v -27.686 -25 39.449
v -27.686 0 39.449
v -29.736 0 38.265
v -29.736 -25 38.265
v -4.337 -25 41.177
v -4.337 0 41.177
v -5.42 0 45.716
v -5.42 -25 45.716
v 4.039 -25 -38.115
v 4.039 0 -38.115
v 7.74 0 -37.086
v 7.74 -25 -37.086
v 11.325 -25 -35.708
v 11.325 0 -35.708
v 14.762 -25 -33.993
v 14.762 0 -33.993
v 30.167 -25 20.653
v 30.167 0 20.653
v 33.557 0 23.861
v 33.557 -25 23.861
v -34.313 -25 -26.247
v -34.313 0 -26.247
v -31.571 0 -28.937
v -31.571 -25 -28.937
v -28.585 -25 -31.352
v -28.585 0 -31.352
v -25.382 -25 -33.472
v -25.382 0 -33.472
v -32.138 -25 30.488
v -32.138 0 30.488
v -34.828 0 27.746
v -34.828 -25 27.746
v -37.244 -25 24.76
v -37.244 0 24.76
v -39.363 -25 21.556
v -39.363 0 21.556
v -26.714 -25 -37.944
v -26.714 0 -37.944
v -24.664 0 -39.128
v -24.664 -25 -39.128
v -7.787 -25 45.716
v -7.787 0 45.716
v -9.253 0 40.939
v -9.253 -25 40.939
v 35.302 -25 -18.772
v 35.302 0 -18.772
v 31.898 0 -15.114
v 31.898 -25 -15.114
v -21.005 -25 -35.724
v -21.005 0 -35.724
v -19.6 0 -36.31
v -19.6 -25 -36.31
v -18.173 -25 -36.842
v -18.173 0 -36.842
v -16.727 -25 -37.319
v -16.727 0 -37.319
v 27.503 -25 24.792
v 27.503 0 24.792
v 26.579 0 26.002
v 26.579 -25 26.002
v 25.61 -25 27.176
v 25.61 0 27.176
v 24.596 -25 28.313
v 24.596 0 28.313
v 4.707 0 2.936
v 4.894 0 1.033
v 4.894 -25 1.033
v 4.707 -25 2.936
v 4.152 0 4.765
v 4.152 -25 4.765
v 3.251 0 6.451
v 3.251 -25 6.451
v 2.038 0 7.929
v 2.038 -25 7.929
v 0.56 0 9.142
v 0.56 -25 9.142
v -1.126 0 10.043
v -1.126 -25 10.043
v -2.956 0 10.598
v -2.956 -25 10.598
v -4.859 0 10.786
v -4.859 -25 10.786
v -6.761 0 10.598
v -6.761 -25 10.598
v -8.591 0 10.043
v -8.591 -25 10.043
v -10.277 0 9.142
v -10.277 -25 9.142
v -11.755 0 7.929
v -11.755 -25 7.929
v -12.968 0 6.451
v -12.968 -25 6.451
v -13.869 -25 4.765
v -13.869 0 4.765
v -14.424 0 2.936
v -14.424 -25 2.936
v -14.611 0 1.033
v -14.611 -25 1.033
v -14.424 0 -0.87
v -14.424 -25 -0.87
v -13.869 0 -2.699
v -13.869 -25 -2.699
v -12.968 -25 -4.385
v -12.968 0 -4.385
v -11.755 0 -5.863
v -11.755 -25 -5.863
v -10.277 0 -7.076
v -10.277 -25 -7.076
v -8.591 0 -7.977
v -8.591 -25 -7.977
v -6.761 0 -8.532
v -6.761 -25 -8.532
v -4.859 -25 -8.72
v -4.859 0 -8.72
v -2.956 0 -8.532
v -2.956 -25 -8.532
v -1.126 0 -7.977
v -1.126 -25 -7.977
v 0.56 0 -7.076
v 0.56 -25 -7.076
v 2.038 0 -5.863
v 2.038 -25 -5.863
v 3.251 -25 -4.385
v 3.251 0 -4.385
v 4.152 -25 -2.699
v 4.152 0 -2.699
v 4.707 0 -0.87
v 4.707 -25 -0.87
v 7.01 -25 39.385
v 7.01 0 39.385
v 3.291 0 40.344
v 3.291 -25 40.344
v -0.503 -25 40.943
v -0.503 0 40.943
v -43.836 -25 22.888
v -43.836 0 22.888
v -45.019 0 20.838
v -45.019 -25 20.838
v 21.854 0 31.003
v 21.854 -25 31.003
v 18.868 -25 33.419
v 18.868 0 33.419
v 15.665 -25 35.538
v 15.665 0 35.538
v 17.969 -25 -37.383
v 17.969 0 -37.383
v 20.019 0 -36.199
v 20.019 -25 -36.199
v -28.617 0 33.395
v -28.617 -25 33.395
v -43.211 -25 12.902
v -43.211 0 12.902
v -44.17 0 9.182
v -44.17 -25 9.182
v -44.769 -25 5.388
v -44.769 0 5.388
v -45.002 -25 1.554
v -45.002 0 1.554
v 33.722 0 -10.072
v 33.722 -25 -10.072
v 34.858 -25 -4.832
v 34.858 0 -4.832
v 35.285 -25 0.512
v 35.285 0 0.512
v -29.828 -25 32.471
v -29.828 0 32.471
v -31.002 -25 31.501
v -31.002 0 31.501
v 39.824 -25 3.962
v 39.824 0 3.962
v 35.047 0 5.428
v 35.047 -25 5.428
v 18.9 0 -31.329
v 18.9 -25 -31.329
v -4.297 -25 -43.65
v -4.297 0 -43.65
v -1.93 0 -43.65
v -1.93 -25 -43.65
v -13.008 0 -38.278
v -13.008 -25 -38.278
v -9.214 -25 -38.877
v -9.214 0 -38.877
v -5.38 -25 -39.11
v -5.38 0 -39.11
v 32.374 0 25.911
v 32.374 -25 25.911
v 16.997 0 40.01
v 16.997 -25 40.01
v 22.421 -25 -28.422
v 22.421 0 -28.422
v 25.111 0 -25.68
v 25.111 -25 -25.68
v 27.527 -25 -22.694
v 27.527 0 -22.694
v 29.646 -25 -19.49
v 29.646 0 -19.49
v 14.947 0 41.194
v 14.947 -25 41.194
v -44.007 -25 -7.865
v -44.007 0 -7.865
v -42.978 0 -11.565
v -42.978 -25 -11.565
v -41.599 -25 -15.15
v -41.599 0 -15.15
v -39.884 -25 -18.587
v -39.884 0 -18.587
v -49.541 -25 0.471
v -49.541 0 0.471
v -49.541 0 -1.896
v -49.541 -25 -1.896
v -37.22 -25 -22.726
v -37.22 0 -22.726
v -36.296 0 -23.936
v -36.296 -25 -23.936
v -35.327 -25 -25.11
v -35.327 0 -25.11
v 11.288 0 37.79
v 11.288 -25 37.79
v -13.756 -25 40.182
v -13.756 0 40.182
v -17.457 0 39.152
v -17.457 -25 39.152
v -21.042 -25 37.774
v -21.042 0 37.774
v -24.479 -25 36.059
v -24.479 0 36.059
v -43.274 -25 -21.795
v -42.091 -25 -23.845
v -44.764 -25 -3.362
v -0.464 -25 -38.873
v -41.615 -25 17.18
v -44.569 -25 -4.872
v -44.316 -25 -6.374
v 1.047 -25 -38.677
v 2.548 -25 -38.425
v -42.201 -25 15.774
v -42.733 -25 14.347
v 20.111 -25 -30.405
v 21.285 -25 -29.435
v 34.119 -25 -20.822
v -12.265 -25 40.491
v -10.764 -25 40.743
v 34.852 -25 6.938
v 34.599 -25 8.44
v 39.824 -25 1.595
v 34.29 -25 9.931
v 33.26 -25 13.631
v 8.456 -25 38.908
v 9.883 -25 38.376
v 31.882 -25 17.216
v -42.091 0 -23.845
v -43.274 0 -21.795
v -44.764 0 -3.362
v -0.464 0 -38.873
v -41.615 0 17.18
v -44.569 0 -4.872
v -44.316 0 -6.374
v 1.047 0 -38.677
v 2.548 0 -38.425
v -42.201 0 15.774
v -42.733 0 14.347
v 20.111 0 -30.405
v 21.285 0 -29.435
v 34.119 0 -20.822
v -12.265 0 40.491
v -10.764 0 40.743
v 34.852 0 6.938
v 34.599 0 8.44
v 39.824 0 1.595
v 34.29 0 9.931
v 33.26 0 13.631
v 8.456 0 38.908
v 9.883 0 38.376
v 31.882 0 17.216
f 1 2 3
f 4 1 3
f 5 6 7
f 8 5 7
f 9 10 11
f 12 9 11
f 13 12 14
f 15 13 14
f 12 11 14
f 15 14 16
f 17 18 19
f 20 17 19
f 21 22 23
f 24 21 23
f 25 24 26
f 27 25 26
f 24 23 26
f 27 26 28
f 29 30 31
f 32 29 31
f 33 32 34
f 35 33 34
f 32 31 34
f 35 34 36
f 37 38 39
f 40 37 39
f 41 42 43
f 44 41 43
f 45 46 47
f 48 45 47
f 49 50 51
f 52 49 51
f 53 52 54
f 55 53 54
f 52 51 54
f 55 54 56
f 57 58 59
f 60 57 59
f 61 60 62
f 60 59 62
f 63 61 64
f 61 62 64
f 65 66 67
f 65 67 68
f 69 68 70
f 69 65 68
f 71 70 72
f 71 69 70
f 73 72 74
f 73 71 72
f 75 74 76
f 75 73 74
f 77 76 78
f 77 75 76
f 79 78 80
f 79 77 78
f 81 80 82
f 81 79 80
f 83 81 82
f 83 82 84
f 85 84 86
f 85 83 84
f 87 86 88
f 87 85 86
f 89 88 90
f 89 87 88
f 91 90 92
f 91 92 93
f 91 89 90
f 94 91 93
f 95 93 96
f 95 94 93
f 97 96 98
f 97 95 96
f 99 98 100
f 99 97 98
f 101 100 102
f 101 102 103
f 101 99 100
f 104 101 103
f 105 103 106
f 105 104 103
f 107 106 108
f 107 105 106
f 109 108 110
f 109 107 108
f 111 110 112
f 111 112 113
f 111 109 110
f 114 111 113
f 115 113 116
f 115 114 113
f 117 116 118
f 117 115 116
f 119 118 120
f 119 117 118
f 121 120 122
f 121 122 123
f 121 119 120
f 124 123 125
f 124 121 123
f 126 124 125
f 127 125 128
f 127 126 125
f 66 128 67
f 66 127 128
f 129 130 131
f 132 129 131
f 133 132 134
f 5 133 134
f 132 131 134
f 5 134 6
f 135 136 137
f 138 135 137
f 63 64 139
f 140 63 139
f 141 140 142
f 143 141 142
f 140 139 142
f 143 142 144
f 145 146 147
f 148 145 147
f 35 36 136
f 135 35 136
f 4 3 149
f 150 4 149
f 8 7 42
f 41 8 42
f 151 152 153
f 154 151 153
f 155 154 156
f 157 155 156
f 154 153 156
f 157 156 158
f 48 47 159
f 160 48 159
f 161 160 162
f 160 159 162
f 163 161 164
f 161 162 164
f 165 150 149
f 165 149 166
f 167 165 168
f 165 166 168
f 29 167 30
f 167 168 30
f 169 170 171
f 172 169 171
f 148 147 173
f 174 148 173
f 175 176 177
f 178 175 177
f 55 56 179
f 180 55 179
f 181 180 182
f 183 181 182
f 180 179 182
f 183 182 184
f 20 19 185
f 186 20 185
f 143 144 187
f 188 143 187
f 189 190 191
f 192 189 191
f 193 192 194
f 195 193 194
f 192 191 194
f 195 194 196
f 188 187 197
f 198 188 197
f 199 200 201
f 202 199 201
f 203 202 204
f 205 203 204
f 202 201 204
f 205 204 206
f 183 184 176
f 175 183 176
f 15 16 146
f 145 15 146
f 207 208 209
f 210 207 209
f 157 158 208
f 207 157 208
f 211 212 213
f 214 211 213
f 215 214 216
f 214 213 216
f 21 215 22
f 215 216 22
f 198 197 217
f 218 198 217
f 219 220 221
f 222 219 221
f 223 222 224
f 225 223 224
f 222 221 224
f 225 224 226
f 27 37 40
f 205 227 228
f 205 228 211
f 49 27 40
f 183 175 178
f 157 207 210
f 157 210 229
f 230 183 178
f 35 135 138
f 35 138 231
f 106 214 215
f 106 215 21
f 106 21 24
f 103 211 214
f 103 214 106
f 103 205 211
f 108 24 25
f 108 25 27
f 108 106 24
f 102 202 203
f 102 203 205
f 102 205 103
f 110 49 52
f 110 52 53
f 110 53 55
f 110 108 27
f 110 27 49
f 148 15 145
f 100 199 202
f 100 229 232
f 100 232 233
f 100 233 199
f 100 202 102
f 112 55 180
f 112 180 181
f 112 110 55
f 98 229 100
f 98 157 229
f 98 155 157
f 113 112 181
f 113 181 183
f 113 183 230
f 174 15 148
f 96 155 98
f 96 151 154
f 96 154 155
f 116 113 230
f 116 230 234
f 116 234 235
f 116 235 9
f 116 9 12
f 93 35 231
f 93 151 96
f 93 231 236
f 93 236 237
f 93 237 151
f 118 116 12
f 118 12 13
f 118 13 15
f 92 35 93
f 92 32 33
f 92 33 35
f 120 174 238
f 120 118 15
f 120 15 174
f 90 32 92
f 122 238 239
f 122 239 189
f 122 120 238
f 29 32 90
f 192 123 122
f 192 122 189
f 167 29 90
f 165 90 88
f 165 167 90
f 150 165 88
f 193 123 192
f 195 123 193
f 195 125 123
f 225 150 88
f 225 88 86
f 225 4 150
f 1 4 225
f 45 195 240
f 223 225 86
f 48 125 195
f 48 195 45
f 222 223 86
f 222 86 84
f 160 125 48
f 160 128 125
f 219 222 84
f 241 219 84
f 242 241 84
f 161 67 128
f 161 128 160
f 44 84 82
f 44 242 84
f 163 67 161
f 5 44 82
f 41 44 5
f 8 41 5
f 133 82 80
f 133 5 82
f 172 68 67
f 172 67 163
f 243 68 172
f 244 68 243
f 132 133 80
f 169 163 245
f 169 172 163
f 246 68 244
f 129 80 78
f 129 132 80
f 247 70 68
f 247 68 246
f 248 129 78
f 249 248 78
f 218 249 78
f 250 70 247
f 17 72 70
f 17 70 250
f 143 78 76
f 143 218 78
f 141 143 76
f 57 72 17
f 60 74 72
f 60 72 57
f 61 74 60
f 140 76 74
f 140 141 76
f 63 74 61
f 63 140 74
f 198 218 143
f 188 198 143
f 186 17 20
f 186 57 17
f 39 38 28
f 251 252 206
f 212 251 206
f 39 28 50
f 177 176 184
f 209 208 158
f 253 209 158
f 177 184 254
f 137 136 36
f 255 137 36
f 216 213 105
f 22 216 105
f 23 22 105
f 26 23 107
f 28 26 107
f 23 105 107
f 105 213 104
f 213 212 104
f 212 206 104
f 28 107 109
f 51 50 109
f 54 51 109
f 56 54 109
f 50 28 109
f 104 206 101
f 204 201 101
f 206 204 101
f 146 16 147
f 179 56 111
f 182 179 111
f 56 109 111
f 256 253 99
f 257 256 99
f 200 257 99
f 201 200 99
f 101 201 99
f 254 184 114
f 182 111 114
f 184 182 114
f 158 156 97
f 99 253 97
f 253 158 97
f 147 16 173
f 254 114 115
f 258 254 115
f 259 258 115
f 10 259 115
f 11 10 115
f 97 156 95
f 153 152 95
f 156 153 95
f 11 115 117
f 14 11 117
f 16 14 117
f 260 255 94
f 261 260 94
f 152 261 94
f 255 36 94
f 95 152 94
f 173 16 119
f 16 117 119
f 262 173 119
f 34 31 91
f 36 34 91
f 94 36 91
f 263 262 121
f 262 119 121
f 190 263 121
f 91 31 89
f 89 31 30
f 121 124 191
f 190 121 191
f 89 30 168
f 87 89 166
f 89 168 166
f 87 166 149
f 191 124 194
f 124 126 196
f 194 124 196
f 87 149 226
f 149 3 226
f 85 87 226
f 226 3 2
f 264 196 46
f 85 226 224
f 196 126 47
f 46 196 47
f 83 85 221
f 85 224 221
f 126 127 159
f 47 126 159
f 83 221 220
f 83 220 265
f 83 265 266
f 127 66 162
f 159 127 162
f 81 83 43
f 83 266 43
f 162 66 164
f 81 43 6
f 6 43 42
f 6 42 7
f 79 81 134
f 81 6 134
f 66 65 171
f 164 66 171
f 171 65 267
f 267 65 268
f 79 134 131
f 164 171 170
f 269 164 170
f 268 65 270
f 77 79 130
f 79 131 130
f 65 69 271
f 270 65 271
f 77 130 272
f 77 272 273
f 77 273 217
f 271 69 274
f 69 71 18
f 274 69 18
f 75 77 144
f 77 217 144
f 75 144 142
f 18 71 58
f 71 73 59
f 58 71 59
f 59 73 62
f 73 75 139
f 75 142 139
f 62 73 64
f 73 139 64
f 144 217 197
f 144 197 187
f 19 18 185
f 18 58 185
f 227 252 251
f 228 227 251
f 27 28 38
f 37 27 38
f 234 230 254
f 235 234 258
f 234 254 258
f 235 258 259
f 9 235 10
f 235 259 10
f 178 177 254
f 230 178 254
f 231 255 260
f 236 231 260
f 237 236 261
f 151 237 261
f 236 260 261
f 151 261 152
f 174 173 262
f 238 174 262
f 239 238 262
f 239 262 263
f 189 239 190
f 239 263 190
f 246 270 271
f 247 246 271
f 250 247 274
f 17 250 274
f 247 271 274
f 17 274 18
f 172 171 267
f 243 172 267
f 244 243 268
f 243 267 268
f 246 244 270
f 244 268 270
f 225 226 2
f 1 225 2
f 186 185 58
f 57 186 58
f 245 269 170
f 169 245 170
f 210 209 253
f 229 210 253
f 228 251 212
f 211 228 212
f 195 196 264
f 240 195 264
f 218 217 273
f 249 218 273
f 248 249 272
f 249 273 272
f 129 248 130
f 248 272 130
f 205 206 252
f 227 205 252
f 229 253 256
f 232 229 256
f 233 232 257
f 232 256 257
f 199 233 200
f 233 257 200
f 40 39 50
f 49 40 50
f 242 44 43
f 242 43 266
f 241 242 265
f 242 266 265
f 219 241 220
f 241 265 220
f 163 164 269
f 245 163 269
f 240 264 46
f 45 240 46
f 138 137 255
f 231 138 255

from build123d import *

# Parameters (mm, degrees)
F1_DEPTH = 25
F0_R     = 9.7528106777
F2_DEPTH = 25
F3_COUNT = 12


with BuildPart() as f1:
    # F0 (on Front) → F1 (new body)
    with BuildSketch(Plane.XZ):
        with BuildLine():
            ThreePointArc((35.2883561629, 1.0330273155), (27.4544642418, 24.8582881027), (7.0100539825, 39.385469638))
            ThreePointArc((7.0100539825, 39.385469638), (1.4007375004, 40.6889829464), (-4.3373688538, 41.1765419779))
            ThreePointArc((-4.3373688538, 41.1765419779), (-6.7990788962, 41.1329986982), (-9.2534905381, 40.9386386143))
            ThreePointArc((-9.2534905381, 40.9386386143), (-31.6478100439, -28.8686194646), (35.2883561629, 1.0330273155))
        make_face()
        with BuildLine():
            ThreePointArc((-4.85854148, 30.3700273155), (14.134700216, 22.5027690116), (22.00195852, 3.5095273155))
            ThreePointArc((22.00195852, 3.5095273155), (-22.4423355568, -16.7955618523), (-8.697145824, 30.0943270504))
            ThreePointArc((-8.697145824, 30.0943270504), (-6.7827876925, 30.3010135894), (-4.85854148, 30.3700273155))
        make_face(mode=Mode.SUBTRACT)
        with BuildLine():
            ThreePointArc((-9.2534905381, 40.9386386143), (-6.7990788962, 41.1329986982), (-4.3373688538, 41.1765419779))
            Line((-4.3373688538, 41.1765419779), (-5.4201926105, 45.7159504294))
            Line((-5.4201926105, 45.7159504294), (-7.7872149896, 45.7159504294))
            Line((-7.7872149896, 45.7159504294), (-9.2534905381, 40.9386386143))
        make_face()
    extrude(amount=F1_DEPTH)

    # F0 (on Front) → F2 (join)
    with BuildSketch(Plane.XZ):
        with BuildLine():
            ThreePointArc((-8.697145824, 30.0943270504), (-22.4423355568, -16.7955618523), (22.00195852, 3.5095273155))
            ThreePointArc((22.00195852, 3.5095273155), (14.134700216, 22.5027690116), (-4.85854148, 30.3700273155))
            ThreePointArc((-4.85854148, 30.3700273155), (-6.7827876925, 30.3010135894), (-8.697145824, 30.0943270504))
        make_face()
        with Locations((-4.85854148, 1.0330273155)):
            Circle(F0_R, mode=Mode.SUBTRACT)
    extrude(amount=F2_DEPTH)

    # F3: F1 ×12 about axis
    f3_axis = Axis((-4.85854148, 0, 1.0330273155), (0, -1, 0))


with BuildPart() as f1_1:
    add(f1.part)
    for i in range(1, F3_COUNT):
        add(f1.part.rotate(f3_axis, i * 360 / F3_COUNT))


solid = f1_1.part
